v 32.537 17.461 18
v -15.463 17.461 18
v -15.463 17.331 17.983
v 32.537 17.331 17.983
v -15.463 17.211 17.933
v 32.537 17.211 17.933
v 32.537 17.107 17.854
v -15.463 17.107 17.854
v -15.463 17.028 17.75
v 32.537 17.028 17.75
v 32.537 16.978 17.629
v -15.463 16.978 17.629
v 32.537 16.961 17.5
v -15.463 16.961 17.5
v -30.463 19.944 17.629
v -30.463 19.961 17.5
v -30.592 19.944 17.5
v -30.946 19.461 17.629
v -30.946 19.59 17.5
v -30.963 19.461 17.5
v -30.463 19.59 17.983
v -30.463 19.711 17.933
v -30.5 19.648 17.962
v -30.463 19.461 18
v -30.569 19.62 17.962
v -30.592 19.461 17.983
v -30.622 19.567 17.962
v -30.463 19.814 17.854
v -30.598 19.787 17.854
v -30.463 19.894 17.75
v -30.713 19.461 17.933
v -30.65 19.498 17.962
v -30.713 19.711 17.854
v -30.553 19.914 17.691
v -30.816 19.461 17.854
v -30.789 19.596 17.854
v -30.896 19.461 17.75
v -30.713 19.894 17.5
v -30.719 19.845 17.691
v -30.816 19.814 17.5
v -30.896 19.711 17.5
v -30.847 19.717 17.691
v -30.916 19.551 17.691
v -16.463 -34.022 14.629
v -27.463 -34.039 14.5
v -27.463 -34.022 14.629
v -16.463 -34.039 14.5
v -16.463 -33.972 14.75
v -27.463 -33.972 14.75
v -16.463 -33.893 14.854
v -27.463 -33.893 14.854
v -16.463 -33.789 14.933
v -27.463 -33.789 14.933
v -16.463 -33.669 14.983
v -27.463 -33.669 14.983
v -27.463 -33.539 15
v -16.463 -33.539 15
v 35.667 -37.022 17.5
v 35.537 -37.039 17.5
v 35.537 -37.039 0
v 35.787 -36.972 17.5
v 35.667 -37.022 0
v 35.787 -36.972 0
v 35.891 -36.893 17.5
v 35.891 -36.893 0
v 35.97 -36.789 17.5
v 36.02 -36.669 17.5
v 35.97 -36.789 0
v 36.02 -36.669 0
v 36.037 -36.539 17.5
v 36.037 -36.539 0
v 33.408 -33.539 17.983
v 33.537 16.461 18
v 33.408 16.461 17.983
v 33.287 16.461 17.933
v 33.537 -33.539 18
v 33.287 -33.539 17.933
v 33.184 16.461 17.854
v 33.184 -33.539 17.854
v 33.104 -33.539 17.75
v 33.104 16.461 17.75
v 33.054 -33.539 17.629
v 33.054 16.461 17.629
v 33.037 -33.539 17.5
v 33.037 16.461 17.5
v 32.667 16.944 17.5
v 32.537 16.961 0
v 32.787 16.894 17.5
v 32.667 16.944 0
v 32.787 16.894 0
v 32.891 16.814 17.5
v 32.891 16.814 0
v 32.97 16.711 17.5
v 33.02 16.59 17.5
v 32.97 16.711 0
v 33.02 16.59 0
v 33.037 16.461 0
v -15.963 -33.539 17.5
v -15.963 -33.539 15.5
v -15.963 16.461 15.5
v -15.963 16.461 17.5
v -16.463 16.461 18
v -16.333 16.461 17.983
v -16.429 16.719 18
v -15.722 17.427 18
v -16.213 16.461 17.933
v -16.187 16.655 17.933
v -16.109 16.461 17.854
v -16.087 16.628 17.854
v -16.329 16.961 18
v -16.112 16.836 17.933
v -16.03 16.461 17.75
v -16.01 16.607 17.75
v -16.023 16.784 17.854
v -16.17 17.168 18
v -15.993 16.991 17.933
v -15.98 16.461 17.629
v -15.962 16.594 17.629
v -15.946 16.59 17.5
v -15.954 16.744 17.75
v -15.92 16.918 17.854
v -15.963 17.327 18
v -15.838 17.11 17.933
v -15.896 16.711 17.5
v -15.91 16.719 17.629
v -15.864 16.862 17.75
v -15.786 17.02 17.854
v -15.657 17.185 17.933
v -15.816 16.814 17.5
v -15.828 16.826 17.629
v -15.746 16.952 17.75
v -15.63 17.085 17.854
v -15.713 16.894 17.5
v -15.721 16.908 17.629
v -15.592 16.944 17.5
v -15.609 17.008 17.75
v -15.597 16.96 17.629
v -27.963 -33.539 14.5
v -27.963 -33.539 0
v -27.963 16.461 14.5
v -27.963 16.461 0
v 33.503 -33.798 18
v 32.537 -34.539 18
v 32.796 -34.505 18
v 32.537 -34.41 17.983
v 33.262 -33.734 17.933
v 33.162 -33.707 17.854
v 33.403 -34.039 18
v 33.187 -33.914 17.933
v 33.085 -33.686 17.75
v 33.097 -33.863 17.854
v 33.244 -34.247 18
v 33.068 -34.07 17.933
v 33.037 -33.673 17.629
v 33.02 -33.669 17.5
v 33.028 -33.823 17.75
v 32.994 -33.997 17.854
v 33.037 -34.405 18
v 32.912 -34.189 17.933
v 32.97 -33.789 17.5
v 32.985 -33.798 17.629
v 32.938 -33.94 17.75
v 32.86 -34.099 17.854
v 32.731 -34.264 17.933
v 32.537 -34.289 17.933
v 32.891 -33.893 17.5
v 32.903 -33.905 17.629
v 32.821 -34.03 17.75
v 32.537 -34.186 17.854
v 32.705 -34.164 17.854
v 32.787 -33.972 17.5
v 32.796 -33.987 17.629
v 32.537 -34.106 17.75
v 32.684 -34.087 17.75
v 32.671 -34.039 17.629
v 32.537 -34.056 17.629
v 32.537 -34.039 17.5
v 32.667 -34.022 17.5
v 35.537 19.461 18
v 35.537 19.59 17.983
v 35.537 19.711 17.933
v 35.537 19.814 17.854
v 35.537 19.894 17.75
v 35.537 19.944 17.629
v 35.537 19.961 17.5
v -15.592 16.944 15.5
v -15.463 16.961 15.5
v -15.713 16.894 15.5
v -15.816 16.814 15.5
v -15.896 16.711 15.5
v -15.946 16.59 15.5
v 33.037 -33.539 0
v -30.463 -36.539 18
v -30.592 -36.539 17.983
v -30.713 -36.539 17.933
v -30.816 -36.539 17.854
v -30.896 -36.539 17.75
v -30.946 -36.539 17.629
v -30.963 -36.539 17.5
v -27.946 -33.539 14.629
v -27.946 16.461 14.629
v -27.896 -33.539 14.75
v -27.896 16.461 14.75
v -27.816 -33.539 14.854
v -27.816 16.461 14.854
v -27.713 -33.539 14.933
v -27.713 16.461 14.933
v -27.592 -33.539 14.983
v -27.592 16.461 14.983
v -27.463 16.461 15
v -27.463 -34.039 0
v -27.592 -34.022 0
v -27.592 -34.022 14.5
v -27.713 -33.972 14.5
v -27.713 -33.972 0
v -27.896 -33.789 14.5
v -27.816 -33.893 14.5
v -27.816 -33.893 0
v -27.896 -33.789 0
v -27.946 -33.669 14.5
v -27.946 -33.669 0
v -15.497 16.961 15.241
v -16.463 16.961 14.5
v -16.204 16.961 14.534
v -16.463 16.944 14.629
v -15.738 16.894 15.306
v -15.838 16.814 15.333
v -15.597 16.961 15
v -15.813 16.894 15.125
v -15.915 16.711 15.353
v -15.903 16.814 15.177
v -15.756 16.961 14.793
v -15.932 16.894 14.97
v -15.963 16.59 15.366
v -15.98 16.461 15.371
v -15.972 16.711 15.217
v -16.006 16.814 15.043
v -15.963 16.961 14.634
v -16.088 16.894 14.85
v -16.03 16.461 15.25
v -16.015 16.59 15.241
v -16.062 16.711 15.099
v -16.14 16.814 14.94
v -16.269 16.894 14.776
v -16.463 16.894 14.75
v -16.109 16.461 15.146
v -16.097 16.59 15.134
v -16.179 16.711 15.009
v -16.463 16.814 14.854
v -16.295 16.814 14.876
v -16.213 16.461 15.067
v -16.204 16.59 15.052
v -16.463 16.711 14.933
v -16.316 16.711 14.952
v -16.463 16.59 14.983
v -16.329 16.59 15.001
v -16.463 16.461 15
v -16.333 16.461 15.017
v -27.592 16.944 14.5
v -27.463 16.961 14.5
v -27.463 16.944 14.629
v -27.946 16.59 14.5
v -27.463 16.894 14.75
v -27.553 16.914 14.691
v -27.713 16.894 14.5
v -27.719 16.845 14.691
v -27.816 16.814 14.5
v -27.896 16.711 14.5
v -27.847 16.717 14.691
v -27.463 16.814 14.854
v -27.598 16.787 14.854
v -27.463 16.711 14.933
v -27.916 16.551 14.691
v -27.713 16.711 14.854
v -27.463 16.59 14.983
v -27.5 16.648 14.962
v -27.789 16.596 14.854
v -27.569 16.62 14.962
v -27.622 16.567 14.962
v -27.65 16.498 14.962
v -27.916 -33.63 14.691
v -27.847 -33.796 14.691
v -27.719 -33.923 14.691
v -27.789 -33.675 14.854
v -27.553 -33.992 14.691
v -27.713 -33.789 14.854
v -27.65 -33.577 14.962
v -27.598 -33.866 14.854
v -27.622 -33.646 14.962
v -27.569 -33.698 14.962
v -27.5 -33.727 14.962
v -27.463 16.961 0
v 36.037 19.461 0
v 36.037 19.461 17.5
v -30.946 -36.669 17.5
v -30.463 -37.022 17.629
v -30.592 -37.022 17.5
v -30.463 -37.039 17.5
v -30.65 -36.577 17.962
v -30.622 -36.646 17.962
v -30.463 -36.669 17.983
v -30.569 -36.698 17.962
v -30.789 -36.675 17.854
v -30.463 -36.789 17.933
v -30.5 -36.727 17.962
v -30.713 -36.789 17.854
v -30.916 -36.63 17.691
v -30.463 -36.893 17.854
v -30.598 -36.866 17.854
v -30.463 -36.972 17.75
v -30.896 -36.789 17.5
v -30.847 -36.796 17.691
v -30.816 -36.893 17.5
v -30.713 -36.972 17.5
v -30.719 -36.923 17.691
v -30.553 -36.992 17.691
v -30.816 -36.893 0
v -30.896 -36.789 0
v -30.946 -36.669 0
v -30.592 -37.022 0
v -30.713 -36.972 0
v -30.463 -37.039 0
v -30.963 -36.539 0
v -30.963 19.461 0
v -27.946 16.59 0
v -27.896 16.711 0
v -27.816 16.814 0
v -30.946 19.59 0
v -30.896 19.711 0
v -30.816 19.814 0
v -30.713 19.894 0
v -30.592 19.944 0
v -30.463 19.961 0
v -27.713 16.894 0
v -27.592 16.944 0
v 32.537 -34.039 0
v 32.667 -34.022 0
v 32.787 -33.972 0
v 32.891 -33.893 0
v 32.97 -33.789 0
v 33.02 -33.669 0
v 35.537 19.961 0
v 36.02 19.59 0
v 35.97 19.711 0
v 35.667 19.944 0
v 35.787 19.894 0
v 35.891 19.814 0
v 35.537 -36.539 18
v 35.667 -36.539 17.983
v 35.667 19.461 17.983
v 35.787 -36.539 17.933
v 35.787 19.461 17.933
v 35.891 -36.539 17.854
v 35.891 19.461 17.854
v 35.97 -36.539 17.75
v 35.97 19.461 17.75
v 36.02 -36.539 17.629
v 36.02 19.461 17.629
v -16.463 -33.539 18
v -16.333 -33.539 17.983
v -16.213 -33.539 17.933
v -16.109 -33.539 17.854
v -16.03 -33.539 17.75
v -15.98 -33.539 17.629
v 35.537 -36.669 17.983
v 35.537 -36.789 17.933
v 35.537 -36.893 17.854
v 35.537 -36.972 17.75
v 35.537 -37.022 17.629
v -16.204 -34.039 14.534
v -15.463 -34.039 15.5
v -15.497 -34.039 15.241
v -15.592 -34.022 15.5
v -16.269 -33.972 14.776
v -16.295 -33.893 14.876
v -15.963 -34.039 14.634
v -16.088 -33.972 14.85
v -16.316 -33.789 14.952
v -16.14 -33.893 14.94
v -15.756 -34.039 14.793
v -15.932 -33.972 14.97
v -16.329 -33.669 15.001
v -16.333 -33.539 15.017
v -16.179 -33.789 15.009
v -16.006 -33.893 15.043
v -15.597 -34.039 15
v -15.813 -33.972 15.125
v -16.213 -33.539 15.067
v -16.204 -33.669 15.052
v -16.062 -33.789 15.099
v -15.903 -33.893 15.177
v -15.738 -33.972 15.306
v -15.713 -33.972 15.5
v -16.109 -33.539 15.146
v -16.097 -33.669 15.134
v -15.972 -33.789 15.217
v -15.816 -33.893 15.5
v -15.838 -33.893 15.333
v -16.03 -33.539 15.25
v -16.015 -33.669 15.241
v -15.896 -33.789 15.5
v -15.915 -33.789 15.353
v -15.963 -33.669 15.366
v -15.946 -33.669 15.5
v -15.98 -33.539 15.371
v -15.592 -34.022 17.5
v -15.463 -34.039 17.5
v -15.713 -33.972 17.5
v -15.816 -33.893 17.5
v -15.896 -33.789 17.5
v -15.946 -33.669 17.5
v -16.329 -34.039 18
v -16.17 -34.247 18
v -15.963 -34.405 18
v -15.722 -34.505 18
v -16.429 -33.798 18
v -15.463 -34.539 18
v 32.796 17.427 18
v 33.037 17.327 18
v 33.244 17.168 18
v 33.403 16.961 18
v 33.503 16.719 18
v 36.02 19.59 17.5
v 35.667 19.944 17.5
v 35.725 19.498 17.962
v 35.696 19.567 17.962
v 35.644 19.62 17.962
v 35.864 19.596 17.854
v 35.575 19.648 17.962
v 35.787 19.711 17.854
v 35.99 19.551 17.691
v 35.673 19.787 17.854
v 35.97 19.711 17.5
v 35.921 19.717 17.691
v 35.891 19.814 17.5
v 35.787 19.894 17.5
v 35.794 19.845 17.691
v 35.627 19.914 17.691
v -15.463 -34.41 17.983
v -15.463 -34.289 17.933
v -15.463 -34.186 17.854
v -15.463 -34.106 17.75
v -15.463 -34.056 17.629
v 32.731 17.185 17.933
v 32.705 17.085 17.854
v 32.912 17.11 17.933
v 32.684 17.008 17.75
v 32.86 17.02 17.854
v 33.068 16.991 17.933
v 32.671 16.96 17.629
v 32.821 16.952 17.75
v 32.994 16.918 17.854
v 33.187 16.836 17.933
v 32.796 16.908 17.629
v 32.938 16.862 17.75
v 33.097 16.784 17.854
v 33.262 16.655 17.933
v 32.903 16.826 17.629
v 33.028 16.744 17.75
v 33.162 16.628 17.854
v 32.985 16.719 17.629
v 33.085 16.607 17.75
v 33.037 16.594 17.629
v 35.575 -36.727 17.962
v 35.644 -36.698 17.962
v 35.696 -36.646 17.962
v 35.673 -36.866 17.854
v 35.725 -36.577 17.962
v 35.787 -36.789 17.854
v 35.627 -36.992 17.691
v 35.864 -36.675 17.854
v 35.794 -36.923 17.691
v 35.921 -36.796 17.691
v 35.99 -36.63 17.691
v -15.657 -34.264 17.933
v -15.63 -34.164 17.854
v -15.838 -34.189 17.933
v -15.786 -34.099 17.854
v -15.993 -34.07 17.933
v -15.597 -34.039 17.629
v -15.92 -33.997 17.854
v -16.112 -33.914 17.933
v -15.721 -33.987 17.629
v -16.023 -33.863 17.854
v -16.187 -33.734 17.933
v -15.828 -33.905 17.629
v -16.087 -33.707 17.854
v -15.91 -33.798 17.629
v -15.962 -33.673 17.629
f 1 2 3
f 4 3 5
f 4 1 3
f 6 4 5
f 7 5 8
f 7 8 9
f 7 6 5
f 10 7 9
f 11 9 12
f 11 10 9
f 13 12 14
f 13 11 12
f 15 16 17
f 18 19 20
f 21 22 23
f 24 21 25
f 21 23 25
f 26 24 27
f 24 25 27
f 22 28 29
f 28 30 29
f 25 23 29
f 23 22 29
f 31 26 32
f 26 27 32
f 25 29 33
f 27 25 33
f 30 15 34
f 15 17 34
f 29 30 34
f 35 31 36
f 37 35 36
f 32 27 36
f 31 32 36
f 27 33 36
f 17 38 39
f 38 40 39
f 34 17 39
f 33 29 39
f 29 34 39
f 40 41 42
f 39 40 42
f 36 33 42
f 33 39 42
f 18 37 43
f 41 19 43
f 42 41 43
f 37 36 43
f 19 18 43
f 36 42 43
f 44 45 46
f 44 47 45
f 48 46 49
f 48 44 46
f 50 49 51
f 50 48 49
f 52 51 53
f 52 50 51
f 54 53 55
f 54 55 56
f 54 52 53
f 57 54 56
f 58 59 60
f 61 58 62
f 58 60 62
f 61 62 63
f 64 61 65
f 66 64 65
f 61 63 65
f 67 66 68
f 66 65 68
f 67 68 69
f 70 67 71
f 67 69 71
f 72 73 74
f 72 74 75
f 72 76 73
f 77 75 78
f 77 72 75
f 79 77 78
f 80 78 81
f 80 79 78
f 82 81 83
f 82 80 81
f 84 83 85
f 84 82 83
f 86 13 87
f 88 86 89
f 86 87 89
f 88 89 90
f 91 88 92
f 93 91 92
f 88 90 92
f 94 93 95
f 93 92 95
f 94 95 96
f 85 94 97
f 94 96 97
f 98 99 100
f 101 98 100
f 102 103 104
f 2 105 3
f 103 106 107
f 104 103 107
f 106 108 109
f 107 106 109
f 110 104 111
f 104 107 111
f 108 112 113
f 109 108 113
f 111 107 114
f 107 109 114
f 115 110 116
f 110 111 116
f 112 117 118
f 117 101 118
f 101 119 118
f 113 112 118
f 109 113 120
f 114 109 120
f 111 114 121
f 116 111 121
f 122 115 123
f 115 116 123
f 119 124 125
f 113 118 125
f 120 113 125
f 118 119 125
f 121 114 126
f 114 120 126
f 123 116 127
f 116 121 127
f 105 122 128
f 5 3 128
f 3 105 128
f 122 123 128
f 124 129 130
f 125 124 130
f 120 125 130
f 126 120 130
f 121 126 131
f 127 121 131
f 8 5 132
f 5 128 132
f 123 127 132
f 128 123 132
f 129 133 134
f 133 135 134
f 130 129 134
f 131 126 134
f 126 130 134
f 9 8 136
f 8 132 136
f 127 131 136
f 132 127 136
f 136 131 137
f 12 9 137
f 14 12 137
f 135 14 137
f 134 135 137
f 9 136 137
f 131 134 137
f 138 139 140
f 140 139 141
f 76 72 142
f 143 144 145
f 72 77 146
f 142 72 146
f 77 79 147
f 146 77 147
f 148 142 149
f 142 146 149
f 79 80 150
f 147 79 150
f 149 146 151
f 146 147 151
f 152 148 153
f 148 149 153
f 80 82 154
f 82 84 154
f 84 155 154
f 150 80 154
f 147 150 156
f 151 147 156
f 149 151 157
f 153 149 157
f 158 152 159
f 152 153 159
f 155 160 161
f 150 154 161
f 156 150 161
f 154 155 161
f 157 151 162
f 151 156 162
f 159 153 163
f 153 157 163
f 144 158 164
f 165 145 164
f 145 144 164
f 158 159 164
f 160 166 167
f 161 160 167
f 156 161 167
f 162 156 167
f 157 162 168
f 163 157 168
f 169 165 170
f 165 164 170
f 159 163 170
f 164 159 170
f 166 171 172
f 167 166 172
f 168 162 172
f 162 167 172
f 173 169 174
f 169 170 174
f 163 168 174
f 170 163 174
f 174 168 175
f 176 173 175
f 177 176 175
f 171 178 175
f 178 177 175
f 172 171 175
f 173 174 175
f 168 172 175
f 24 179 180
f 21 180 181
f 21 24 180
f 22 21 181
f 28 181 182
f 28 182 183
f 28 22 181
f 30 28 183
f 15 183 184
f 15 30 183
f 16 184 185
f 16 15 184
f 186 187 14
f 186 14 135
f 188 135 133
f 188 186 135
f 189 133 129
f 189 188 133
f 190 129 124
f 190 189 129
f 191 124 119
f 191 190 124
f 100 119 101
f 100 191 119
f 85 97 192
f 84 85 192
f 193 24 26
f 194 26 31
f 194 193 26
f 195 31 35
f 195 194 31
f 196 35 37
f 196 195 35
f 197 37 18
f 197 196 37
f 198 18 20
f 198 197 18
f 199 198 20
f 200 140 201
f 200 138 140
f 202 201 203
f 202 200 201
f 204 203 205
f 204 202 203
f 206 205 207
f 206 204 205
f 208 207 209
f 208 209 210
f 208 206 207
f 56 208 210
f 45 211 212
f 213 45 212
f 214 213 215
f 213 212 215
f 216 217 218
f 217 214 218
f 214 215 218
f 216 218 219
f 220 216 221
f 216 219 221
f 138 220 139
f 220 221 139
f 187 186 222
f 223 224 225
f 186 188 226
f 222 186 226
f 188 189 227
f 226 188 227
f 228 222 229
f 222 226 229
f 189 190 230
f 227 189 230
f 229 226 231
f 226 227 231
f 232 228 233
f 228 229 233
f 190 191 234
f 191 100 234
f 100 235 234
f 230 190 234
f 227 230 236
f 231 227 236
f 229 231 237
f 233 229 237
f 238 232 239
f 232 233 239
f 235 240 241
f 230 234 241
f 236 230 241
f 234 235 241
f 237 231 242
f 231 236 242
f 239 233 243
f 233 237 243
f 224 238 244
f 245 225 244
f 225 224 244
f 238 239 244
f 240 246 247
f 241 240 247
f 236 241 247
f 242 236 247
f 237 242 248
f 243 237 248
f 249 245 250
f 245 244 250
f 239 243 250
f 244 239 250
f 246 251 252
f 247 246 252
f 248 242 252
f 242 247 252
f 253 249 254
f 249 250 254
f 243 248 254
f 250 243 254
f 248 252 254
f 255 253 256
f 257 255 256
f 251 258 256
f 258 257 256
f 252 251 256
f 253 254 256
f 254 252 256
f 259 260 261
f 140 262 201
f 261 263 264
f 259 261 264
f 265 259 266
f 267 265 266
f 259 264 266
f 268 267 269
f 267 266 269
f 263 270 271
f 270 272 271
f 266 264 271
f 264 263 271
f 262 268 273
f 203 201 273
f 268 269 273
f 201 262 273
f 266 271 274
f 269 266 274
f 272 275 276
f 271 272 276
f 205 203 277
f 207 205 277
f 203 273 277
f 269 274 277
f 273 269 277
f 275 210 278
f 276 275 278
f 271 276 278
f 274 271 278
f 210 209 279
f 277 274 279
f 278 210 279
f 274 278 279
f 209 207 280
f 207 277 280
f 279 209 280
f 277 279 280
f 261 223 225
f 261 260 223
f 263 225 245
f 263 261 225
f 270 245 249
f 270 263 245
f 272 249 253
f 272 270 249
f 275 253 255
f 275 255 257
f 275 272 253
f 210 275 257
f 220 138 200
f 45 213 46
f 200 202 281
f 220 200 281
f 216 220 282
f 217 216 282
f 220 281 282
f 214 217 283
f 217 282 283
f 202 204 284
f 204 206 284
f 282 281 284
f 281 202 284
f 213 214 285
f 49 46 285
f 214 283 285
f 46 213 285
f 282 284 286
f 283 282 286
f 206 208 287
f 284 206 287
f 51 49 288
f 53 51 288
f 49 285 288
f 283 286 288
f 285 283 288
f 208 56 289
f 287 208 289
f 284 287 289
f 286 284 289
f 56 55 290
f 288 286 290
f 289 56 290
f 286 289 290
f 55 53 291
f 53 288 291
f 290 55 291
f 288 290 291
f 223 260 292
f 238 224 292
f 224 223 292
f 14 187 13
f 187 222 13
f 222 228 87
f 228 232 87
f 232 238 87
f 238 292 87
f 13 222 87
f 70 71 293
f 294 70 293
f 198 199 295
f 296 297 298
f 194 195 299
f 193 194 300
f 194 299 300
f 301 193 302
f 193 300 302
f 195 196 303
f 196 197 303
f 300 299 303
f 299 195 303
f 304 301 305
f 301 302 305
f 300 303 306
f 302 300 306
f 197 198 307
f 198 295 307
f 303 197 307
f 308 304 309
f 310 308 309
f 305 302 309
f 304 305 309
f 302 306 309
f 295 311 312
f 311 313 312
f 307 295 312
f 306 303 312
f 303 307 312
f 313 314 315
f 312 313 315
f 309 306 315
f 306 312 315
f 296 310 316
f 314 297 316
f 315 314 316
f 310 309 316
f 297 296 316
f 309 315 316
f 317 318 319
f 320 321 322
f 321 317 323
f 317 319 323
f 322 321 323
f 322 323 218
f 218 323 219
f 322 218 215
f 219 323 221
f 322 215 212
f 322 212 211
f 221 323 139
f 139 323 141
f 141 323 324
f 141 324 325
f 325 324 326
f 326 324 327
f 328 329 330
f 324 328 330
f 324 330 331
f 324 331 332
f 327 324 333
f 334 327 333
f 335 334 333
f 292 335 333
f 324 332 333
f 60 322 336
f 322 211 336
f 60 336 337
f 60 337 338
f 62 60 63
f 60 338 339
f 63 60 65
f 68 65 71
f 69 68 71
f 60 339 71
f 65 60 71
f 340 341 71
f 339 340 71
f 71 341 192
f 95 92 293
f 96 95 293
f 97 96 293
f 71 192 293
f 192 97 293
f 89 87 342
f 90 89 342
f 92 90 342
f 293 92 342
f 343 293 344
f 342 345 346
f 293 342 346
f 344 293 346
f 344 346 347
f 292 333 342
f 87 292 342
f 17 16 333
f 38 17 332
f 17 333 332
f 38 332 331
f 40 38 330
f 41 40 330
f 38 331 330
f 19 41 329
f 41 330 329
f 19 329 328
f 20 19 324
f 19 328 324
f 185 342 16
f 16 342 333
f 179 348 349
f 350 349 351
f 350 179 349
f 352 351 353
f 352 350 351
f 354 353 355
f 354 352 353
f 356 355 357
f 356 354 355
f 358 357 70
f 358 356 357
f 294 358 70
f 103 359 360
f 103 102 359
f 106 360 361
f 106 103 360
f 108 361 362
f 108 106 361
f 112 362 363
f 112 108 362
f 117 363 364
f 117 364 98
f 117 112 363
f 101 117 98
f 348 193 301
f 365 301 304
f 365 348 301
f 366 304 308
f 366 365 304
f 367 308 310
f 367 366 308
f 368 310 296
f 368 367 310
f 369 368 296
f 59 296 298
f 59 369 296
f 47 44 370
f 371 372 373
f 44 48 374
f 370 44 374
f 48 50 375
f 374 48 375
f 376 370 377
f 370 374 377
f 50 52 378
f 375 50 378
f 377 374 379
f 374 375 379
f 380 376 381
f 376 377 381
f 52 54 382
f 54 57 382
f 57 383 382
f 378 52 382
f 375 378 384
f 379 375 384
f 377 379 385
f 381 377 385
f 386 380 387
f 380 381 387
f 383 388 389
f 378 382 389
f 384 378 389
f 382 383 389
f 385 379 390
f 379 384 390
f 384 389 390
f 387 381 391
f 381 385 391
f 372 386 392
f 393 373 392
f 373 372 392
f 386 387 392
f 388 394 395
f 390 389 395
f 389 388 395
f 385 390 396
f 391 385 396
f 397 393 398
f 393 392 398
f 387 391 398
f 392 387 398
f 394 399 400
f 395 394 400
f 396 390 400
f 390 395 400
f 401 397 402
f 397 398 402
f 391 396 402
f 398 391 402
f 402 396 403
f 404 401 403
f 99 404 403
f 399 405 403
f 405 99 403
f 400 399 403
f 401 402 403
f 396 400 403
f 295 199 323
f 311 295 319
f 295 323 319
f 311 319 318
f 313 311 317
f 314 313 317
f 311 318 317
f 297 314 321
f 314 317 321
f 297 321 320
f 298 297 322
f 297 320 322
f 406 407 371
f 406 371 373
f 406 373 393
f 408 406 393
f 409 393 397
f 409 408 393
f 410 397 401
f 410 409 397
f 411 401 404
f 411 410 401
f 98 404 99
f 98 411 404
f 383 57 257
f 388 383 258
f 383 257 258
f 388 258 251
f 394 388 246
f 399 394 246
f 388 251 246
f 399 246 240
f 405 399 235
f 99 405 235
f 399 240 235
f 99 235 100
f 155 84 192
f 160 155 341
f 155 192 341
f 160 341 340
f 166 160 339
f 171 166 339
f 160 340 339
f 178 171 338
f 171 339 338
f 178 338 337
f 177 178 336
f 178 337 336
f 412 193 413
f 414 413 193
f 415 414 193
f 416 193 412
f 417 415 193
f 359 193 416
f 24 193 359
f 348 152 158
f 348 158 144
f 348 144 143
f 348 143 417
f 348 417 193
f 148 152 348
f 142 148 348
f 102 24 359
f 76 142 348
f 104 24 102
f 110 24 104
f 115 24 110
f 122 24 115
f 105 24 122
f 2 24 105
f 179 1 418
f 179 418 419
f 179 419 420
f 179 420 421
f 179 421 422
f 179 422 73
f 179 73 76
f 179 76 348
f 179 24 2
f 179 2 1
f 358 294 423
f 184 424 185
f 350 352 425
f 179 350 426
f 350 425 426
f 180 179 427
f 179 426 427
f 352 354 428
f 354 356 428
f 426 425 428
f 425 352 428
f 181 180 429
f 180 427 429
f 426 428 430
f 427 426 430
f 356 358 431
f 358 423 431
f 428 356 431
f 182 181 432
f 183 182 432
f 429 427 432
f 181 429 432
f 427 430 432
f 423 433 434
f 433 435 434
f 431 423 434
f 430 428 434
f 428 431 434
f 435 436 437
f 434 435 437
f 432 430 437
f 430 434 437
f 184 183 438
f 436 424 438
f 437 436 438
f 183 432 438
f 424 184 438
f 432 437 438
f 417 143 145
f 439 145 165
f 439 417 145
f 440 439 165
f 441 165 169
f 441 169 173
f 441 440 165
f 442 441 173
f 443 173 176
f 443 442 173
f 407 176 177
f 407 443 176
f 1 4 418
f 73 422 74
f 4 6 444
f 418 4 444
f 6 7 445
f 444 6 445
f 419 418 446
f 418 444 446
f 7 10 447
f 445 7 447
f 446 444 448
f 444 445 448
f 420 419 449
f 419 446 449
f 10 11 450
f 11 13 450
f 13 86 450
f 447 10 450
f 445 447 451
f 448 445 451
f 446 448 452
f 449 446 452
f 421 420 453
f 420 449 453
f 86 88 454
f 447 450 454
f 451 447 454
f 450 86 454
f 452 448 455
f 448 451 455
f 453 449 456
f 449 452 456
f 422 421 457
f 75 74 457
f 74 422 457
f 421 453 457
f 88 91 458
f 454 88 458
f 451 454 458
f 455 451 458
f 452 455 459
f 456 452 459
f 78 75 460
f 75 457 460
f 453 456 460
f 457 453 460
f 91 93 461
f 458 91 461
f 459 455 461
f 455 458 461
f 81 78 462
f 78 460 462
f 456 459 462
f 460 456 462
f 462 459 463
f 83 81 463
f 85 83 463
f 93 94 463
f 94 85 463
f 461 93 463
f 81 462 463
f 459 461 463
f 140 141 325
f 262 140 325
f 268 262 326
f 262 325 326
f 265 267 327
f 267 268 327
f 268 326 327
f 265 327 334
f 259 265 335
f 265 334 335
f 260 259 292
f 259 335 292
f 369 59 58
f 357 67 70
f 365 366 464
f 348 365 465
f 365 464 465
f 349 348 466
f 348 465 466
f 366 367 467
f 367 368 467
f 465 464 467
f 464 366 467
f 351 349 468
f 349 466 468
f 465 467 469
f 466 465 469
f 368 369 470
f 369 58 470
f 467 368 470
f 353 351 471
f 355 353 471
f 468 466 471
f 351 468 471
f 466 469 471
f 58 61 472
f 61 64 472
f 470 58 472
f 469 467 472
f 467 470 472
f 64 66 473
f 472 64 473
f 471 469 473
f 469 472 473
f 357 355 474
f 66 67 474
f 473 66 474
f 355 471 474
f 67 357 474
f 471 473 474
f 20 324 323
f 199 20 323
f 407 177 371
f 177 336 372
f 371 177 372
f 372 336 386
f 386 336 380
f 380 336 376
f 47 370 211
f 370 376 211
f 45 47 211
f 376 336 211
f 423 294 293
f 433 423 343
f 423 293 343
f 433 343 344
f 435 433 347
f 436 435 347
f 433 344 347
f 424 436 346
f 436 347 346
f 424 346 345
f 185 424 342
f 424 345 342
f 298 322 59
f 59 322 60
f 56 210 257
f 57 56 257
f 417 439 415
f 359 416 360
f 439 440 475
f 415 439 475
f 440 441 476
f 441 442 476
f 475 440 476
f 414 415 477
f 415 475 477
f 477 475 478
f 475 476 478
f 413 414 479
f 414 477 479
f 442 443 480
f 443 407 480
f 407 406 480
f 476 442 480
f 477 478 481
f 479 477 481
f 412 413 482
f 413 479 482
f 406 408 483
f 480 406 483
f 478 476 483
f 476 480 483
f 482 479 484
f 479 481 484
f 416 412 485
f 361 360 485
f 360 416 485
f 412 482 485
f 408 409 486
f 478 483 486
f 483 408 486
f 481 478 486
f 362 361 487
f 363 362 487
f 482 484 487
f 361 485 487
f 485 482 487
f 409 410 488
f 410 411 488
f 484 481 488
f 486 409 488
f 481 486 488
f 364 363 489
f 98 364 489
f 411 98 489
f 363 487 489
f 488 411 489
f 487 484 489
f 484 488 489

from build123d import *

# Parameters (mm, degrees)
F1_DEPTH = 15
F3_DEPTH = 3
F4_F1_R  = 0.5
F4_F2_R  = 0.5
F4_F3_R  = 0.5
F4_F4_R  = 0.5


with BuildPart() as f1:
    # F0 (on Top) → F1 (new body)
    with BuildSketch(Plane.XY):
        with BuildLine():
            Line((35.5372718227, 19.9606023237), (-30.4627281773, 19.9606023237))
            ThreePointArc((-30.4627281773, 19.9606023237), (-30.8162815679, 19.8141557143), (-30.9627281773, 19.4606023237))
            Line((-30.9627281773, 19.4606023237), (-30.9627281773, -36.5393976763))
            ThreePointArc((-30.9627281773, -36.5393976763), (-30.8162815679, -36.8929510669), (-30.4627281773, -37.0393976763))
            Line((-30.4627281773, -37.0393976763), (35.5372718227, -37.0393976763))
            ThreePointArc((35.5372718227, -37.0393976763), (35.8908252133, -36.8929510669), (36.0372718227, -36.5393976763))
            Line((36.0372718227, -36.5393976763), (36.0372718227, 19.4606023237))
            ThreePointArc((36.0372718227, 19.4606023237), (35.8908252133, 19.8141557143), (35.5372718227, 19.9606023237))
        make_face()
        with BuildLine():
            ThreePointArc((-27.9627281773, 16.4606023237), (-27.8162815679, 16.8141557143), (-27.4627281773, 16.9606023237))
            Line((-27.4627281773, 16.9606023237), (32.5372718227, 16.9606023237))
            ThreePointArc((32.5372718227, 16.9606023237), (32.8908252133, 16.8141557143), (33.0372718227, 16.4606023237))
            Line((33.0372718227, 16.4606023237), (33.0372718227, -33.5393976763))
            ThreePointArc((33.0372718227, -33.5393976763), (32.8908252133, -33.8929510669), (32.5372718227, -34.0393976763))
            Line((32.5372718227, -34.0393976763), (-27.4627281773, -34.0393976763))
            ThreePointArc((-27.4627281773, -34.0393976763), (-27.8162815679, -33.8929510669), (-27.9627281773, -33.5393976763))
            Line((-27.9627281773, -33.5393976763), (-27.9627281773, 16.4606023237))
        make_face(mode=Mode.SUBTRACT)
    extrude(amount=F1_DEPTH)

    # F2 (on face) → F3 (join)
    with BuildSketch(Plane.XY.offset(15)):
        with BuildLine():
            Line((-15.9627281773, -34.0393976763), (-15.9627281773, 16.9606023237))
            Line((-15.9627281773, 16.9606023237), (-27.4627281773, 16.9606023237))
            ThreePointArc((-27.4627281773, 16.9606023237), (-27.8162815679, 16.8141557143), (-27.9627281773, 16.4606023237))
            Line((-27.9627281773, 16.4606023237), (-27.9627281773, -33.5393976763))
            ThreePointArc((-27.9627281773, -33.5393976763), (-27.8162815679, -33.8929510669), (-27.4627281773, -34.0393976763))
            Line((-27.4627281773, -34.0393976763), (-15.9627281773, -34.0393976763))
        make_face()
        with BuildLine():
            ThreePointArc((-30.4627281773, 19.9606023237), (-30.8162815679, 19.8141557143), (-30.9627281773, 19.4606023237))
            Line((-30.9627281773, 19.4606023237), (-30.9627281773, -36.5393976763))
            ThreePointArc((-30.9627281773, -36.5393976763), (-30.8162815679, -36.8929510669), (-30.4627281773, -37.0393976763))
            Line((-30.4627281773, -37.0393976763), (-15.9627281773, -37.0393976763))
            Line((-15.9627281773, -37.0393976763), (-15.9627281773, -34.0393976763))
            Line((-15.9627281773, -34.0393976763), (-27.4627281773, -34.0393976763))
            ThreePointArc((-27.4627281773, -34.0393976763), (-27.8162815679, -33.8929510669), (-27.9627281773, -33.5393976763))
            Line((-27.9627281773, -33.5393976763), (-27.9627281773, 16.4606023237))
            ThreePointArc((-27.9627281773, 16.4606023237), (-27.8162815679, 16.8141557143), (-27.4627281773, 16.9606023237))
            Line((-27.4627281773, 16.9606023237), (-15.9627281773, 16.9606023237))
            Line((-15.9627281773, 16.9606023237), (-15.9627281773, 19.9606023237))
            Line((-15.9627281773, 19.9606023237), (-30.4627281773, 19.9606023237))
        make_face()
        with BuildLine():
            Line((35.5372718227, 19.9606023237), (-15.9627281773, 19.9606023237))
            Line((-15.9627281773, 19.9606023237), (-15.9627281773, 16.9606023237))
            Line((-15.9627281773, 16.9606023237), (32.5372718227, 16.9606023237))
            ThreePointArc((32.5372718227, 16.9606023237), (32.8908252133, 16.8141557143), (33.0372718227, 16.4606023237))
            Line((33.0372718227, 16.4606023237), (33.0372718227, -33.5393976763))
            ThreePointArc((33.0372718227, -33.5393976763), (32.8908252133, -33.8929510669), (32.5372718227, -34.0393976763))
            Line((32.5372718227, -34.0393976763), (-15.9627281773, -34.0393976763))
            Line((-15.9627281773, -34.0393976763), (-15.9627281773, -37.0393976763))
            Line((-15.9627281773, -37.0393976763), (35.5372718227, -37.0393976763))
            ThreePointArc((35.5372718227, -37.0393976763), (35.8908252133, -36.8929510669), (36.0372718227, -36.5393976763))
            Line((36.0372718227, -36.5393976763), (36.0372718227, 19.4606023237))
            ThreePointArc((36.0372718227, 19.4606023237), (35.8908252133, 19.8141557143), (35.5372718227, 19.9606023237))
        make_face()
    extrude(amount=F3_DEPTH)

    # F4: fillet of radius 0.5 on 7 edges, made by hand

    # F4_f1
    f4_f1_edges = [f1.edges().sort_by_distance(p)[0] for p in [
        (2.5372718227, 19.9606023237, 18),
        (36.0372718227, -8.5393976763, 18),
        (35.8908252133, -36.8929510669, 18),
        (2.5372718227, -37.0393976763, 18),
        (-30.8162815679, -36.8929510669, 18),
        (-30.9627281773, -8.5393976763, 18),
        (-30.8162815679, 19.8141557143, 18),
        (35.8908252133, 19.8141557143, 18),
    ]]
    fillet(f4_f1_edges, radius=F4_F1_R)

    # F4_f2
    f4_f2_edges = [f1.edges().sort_by_distance(p)[0] for p in [
        (-15.9627281773, -8.5393976763, 15),
    ]]
    fillet(f4_f2_edges, radius=F4_F2_R)

    # F4_f3
    f4_f3_edges = [f1.edges().sort_by_distance(p)[0] for p in [
        (-15.9627281773, -34.0393976763, 16.75),
    ]]
    fillet(f4_f3_edges, radius=F4_F3_R)

    # F4_f4
    f4_f4_edges = [f1.edges().sort_by_distance(p)[0] for p in [
        (-15.9627281773, -8.5393976763, 18),
    ]]
    fillet(f4_f4_edges, radius=F4_F4_R)


solid = f1.part
